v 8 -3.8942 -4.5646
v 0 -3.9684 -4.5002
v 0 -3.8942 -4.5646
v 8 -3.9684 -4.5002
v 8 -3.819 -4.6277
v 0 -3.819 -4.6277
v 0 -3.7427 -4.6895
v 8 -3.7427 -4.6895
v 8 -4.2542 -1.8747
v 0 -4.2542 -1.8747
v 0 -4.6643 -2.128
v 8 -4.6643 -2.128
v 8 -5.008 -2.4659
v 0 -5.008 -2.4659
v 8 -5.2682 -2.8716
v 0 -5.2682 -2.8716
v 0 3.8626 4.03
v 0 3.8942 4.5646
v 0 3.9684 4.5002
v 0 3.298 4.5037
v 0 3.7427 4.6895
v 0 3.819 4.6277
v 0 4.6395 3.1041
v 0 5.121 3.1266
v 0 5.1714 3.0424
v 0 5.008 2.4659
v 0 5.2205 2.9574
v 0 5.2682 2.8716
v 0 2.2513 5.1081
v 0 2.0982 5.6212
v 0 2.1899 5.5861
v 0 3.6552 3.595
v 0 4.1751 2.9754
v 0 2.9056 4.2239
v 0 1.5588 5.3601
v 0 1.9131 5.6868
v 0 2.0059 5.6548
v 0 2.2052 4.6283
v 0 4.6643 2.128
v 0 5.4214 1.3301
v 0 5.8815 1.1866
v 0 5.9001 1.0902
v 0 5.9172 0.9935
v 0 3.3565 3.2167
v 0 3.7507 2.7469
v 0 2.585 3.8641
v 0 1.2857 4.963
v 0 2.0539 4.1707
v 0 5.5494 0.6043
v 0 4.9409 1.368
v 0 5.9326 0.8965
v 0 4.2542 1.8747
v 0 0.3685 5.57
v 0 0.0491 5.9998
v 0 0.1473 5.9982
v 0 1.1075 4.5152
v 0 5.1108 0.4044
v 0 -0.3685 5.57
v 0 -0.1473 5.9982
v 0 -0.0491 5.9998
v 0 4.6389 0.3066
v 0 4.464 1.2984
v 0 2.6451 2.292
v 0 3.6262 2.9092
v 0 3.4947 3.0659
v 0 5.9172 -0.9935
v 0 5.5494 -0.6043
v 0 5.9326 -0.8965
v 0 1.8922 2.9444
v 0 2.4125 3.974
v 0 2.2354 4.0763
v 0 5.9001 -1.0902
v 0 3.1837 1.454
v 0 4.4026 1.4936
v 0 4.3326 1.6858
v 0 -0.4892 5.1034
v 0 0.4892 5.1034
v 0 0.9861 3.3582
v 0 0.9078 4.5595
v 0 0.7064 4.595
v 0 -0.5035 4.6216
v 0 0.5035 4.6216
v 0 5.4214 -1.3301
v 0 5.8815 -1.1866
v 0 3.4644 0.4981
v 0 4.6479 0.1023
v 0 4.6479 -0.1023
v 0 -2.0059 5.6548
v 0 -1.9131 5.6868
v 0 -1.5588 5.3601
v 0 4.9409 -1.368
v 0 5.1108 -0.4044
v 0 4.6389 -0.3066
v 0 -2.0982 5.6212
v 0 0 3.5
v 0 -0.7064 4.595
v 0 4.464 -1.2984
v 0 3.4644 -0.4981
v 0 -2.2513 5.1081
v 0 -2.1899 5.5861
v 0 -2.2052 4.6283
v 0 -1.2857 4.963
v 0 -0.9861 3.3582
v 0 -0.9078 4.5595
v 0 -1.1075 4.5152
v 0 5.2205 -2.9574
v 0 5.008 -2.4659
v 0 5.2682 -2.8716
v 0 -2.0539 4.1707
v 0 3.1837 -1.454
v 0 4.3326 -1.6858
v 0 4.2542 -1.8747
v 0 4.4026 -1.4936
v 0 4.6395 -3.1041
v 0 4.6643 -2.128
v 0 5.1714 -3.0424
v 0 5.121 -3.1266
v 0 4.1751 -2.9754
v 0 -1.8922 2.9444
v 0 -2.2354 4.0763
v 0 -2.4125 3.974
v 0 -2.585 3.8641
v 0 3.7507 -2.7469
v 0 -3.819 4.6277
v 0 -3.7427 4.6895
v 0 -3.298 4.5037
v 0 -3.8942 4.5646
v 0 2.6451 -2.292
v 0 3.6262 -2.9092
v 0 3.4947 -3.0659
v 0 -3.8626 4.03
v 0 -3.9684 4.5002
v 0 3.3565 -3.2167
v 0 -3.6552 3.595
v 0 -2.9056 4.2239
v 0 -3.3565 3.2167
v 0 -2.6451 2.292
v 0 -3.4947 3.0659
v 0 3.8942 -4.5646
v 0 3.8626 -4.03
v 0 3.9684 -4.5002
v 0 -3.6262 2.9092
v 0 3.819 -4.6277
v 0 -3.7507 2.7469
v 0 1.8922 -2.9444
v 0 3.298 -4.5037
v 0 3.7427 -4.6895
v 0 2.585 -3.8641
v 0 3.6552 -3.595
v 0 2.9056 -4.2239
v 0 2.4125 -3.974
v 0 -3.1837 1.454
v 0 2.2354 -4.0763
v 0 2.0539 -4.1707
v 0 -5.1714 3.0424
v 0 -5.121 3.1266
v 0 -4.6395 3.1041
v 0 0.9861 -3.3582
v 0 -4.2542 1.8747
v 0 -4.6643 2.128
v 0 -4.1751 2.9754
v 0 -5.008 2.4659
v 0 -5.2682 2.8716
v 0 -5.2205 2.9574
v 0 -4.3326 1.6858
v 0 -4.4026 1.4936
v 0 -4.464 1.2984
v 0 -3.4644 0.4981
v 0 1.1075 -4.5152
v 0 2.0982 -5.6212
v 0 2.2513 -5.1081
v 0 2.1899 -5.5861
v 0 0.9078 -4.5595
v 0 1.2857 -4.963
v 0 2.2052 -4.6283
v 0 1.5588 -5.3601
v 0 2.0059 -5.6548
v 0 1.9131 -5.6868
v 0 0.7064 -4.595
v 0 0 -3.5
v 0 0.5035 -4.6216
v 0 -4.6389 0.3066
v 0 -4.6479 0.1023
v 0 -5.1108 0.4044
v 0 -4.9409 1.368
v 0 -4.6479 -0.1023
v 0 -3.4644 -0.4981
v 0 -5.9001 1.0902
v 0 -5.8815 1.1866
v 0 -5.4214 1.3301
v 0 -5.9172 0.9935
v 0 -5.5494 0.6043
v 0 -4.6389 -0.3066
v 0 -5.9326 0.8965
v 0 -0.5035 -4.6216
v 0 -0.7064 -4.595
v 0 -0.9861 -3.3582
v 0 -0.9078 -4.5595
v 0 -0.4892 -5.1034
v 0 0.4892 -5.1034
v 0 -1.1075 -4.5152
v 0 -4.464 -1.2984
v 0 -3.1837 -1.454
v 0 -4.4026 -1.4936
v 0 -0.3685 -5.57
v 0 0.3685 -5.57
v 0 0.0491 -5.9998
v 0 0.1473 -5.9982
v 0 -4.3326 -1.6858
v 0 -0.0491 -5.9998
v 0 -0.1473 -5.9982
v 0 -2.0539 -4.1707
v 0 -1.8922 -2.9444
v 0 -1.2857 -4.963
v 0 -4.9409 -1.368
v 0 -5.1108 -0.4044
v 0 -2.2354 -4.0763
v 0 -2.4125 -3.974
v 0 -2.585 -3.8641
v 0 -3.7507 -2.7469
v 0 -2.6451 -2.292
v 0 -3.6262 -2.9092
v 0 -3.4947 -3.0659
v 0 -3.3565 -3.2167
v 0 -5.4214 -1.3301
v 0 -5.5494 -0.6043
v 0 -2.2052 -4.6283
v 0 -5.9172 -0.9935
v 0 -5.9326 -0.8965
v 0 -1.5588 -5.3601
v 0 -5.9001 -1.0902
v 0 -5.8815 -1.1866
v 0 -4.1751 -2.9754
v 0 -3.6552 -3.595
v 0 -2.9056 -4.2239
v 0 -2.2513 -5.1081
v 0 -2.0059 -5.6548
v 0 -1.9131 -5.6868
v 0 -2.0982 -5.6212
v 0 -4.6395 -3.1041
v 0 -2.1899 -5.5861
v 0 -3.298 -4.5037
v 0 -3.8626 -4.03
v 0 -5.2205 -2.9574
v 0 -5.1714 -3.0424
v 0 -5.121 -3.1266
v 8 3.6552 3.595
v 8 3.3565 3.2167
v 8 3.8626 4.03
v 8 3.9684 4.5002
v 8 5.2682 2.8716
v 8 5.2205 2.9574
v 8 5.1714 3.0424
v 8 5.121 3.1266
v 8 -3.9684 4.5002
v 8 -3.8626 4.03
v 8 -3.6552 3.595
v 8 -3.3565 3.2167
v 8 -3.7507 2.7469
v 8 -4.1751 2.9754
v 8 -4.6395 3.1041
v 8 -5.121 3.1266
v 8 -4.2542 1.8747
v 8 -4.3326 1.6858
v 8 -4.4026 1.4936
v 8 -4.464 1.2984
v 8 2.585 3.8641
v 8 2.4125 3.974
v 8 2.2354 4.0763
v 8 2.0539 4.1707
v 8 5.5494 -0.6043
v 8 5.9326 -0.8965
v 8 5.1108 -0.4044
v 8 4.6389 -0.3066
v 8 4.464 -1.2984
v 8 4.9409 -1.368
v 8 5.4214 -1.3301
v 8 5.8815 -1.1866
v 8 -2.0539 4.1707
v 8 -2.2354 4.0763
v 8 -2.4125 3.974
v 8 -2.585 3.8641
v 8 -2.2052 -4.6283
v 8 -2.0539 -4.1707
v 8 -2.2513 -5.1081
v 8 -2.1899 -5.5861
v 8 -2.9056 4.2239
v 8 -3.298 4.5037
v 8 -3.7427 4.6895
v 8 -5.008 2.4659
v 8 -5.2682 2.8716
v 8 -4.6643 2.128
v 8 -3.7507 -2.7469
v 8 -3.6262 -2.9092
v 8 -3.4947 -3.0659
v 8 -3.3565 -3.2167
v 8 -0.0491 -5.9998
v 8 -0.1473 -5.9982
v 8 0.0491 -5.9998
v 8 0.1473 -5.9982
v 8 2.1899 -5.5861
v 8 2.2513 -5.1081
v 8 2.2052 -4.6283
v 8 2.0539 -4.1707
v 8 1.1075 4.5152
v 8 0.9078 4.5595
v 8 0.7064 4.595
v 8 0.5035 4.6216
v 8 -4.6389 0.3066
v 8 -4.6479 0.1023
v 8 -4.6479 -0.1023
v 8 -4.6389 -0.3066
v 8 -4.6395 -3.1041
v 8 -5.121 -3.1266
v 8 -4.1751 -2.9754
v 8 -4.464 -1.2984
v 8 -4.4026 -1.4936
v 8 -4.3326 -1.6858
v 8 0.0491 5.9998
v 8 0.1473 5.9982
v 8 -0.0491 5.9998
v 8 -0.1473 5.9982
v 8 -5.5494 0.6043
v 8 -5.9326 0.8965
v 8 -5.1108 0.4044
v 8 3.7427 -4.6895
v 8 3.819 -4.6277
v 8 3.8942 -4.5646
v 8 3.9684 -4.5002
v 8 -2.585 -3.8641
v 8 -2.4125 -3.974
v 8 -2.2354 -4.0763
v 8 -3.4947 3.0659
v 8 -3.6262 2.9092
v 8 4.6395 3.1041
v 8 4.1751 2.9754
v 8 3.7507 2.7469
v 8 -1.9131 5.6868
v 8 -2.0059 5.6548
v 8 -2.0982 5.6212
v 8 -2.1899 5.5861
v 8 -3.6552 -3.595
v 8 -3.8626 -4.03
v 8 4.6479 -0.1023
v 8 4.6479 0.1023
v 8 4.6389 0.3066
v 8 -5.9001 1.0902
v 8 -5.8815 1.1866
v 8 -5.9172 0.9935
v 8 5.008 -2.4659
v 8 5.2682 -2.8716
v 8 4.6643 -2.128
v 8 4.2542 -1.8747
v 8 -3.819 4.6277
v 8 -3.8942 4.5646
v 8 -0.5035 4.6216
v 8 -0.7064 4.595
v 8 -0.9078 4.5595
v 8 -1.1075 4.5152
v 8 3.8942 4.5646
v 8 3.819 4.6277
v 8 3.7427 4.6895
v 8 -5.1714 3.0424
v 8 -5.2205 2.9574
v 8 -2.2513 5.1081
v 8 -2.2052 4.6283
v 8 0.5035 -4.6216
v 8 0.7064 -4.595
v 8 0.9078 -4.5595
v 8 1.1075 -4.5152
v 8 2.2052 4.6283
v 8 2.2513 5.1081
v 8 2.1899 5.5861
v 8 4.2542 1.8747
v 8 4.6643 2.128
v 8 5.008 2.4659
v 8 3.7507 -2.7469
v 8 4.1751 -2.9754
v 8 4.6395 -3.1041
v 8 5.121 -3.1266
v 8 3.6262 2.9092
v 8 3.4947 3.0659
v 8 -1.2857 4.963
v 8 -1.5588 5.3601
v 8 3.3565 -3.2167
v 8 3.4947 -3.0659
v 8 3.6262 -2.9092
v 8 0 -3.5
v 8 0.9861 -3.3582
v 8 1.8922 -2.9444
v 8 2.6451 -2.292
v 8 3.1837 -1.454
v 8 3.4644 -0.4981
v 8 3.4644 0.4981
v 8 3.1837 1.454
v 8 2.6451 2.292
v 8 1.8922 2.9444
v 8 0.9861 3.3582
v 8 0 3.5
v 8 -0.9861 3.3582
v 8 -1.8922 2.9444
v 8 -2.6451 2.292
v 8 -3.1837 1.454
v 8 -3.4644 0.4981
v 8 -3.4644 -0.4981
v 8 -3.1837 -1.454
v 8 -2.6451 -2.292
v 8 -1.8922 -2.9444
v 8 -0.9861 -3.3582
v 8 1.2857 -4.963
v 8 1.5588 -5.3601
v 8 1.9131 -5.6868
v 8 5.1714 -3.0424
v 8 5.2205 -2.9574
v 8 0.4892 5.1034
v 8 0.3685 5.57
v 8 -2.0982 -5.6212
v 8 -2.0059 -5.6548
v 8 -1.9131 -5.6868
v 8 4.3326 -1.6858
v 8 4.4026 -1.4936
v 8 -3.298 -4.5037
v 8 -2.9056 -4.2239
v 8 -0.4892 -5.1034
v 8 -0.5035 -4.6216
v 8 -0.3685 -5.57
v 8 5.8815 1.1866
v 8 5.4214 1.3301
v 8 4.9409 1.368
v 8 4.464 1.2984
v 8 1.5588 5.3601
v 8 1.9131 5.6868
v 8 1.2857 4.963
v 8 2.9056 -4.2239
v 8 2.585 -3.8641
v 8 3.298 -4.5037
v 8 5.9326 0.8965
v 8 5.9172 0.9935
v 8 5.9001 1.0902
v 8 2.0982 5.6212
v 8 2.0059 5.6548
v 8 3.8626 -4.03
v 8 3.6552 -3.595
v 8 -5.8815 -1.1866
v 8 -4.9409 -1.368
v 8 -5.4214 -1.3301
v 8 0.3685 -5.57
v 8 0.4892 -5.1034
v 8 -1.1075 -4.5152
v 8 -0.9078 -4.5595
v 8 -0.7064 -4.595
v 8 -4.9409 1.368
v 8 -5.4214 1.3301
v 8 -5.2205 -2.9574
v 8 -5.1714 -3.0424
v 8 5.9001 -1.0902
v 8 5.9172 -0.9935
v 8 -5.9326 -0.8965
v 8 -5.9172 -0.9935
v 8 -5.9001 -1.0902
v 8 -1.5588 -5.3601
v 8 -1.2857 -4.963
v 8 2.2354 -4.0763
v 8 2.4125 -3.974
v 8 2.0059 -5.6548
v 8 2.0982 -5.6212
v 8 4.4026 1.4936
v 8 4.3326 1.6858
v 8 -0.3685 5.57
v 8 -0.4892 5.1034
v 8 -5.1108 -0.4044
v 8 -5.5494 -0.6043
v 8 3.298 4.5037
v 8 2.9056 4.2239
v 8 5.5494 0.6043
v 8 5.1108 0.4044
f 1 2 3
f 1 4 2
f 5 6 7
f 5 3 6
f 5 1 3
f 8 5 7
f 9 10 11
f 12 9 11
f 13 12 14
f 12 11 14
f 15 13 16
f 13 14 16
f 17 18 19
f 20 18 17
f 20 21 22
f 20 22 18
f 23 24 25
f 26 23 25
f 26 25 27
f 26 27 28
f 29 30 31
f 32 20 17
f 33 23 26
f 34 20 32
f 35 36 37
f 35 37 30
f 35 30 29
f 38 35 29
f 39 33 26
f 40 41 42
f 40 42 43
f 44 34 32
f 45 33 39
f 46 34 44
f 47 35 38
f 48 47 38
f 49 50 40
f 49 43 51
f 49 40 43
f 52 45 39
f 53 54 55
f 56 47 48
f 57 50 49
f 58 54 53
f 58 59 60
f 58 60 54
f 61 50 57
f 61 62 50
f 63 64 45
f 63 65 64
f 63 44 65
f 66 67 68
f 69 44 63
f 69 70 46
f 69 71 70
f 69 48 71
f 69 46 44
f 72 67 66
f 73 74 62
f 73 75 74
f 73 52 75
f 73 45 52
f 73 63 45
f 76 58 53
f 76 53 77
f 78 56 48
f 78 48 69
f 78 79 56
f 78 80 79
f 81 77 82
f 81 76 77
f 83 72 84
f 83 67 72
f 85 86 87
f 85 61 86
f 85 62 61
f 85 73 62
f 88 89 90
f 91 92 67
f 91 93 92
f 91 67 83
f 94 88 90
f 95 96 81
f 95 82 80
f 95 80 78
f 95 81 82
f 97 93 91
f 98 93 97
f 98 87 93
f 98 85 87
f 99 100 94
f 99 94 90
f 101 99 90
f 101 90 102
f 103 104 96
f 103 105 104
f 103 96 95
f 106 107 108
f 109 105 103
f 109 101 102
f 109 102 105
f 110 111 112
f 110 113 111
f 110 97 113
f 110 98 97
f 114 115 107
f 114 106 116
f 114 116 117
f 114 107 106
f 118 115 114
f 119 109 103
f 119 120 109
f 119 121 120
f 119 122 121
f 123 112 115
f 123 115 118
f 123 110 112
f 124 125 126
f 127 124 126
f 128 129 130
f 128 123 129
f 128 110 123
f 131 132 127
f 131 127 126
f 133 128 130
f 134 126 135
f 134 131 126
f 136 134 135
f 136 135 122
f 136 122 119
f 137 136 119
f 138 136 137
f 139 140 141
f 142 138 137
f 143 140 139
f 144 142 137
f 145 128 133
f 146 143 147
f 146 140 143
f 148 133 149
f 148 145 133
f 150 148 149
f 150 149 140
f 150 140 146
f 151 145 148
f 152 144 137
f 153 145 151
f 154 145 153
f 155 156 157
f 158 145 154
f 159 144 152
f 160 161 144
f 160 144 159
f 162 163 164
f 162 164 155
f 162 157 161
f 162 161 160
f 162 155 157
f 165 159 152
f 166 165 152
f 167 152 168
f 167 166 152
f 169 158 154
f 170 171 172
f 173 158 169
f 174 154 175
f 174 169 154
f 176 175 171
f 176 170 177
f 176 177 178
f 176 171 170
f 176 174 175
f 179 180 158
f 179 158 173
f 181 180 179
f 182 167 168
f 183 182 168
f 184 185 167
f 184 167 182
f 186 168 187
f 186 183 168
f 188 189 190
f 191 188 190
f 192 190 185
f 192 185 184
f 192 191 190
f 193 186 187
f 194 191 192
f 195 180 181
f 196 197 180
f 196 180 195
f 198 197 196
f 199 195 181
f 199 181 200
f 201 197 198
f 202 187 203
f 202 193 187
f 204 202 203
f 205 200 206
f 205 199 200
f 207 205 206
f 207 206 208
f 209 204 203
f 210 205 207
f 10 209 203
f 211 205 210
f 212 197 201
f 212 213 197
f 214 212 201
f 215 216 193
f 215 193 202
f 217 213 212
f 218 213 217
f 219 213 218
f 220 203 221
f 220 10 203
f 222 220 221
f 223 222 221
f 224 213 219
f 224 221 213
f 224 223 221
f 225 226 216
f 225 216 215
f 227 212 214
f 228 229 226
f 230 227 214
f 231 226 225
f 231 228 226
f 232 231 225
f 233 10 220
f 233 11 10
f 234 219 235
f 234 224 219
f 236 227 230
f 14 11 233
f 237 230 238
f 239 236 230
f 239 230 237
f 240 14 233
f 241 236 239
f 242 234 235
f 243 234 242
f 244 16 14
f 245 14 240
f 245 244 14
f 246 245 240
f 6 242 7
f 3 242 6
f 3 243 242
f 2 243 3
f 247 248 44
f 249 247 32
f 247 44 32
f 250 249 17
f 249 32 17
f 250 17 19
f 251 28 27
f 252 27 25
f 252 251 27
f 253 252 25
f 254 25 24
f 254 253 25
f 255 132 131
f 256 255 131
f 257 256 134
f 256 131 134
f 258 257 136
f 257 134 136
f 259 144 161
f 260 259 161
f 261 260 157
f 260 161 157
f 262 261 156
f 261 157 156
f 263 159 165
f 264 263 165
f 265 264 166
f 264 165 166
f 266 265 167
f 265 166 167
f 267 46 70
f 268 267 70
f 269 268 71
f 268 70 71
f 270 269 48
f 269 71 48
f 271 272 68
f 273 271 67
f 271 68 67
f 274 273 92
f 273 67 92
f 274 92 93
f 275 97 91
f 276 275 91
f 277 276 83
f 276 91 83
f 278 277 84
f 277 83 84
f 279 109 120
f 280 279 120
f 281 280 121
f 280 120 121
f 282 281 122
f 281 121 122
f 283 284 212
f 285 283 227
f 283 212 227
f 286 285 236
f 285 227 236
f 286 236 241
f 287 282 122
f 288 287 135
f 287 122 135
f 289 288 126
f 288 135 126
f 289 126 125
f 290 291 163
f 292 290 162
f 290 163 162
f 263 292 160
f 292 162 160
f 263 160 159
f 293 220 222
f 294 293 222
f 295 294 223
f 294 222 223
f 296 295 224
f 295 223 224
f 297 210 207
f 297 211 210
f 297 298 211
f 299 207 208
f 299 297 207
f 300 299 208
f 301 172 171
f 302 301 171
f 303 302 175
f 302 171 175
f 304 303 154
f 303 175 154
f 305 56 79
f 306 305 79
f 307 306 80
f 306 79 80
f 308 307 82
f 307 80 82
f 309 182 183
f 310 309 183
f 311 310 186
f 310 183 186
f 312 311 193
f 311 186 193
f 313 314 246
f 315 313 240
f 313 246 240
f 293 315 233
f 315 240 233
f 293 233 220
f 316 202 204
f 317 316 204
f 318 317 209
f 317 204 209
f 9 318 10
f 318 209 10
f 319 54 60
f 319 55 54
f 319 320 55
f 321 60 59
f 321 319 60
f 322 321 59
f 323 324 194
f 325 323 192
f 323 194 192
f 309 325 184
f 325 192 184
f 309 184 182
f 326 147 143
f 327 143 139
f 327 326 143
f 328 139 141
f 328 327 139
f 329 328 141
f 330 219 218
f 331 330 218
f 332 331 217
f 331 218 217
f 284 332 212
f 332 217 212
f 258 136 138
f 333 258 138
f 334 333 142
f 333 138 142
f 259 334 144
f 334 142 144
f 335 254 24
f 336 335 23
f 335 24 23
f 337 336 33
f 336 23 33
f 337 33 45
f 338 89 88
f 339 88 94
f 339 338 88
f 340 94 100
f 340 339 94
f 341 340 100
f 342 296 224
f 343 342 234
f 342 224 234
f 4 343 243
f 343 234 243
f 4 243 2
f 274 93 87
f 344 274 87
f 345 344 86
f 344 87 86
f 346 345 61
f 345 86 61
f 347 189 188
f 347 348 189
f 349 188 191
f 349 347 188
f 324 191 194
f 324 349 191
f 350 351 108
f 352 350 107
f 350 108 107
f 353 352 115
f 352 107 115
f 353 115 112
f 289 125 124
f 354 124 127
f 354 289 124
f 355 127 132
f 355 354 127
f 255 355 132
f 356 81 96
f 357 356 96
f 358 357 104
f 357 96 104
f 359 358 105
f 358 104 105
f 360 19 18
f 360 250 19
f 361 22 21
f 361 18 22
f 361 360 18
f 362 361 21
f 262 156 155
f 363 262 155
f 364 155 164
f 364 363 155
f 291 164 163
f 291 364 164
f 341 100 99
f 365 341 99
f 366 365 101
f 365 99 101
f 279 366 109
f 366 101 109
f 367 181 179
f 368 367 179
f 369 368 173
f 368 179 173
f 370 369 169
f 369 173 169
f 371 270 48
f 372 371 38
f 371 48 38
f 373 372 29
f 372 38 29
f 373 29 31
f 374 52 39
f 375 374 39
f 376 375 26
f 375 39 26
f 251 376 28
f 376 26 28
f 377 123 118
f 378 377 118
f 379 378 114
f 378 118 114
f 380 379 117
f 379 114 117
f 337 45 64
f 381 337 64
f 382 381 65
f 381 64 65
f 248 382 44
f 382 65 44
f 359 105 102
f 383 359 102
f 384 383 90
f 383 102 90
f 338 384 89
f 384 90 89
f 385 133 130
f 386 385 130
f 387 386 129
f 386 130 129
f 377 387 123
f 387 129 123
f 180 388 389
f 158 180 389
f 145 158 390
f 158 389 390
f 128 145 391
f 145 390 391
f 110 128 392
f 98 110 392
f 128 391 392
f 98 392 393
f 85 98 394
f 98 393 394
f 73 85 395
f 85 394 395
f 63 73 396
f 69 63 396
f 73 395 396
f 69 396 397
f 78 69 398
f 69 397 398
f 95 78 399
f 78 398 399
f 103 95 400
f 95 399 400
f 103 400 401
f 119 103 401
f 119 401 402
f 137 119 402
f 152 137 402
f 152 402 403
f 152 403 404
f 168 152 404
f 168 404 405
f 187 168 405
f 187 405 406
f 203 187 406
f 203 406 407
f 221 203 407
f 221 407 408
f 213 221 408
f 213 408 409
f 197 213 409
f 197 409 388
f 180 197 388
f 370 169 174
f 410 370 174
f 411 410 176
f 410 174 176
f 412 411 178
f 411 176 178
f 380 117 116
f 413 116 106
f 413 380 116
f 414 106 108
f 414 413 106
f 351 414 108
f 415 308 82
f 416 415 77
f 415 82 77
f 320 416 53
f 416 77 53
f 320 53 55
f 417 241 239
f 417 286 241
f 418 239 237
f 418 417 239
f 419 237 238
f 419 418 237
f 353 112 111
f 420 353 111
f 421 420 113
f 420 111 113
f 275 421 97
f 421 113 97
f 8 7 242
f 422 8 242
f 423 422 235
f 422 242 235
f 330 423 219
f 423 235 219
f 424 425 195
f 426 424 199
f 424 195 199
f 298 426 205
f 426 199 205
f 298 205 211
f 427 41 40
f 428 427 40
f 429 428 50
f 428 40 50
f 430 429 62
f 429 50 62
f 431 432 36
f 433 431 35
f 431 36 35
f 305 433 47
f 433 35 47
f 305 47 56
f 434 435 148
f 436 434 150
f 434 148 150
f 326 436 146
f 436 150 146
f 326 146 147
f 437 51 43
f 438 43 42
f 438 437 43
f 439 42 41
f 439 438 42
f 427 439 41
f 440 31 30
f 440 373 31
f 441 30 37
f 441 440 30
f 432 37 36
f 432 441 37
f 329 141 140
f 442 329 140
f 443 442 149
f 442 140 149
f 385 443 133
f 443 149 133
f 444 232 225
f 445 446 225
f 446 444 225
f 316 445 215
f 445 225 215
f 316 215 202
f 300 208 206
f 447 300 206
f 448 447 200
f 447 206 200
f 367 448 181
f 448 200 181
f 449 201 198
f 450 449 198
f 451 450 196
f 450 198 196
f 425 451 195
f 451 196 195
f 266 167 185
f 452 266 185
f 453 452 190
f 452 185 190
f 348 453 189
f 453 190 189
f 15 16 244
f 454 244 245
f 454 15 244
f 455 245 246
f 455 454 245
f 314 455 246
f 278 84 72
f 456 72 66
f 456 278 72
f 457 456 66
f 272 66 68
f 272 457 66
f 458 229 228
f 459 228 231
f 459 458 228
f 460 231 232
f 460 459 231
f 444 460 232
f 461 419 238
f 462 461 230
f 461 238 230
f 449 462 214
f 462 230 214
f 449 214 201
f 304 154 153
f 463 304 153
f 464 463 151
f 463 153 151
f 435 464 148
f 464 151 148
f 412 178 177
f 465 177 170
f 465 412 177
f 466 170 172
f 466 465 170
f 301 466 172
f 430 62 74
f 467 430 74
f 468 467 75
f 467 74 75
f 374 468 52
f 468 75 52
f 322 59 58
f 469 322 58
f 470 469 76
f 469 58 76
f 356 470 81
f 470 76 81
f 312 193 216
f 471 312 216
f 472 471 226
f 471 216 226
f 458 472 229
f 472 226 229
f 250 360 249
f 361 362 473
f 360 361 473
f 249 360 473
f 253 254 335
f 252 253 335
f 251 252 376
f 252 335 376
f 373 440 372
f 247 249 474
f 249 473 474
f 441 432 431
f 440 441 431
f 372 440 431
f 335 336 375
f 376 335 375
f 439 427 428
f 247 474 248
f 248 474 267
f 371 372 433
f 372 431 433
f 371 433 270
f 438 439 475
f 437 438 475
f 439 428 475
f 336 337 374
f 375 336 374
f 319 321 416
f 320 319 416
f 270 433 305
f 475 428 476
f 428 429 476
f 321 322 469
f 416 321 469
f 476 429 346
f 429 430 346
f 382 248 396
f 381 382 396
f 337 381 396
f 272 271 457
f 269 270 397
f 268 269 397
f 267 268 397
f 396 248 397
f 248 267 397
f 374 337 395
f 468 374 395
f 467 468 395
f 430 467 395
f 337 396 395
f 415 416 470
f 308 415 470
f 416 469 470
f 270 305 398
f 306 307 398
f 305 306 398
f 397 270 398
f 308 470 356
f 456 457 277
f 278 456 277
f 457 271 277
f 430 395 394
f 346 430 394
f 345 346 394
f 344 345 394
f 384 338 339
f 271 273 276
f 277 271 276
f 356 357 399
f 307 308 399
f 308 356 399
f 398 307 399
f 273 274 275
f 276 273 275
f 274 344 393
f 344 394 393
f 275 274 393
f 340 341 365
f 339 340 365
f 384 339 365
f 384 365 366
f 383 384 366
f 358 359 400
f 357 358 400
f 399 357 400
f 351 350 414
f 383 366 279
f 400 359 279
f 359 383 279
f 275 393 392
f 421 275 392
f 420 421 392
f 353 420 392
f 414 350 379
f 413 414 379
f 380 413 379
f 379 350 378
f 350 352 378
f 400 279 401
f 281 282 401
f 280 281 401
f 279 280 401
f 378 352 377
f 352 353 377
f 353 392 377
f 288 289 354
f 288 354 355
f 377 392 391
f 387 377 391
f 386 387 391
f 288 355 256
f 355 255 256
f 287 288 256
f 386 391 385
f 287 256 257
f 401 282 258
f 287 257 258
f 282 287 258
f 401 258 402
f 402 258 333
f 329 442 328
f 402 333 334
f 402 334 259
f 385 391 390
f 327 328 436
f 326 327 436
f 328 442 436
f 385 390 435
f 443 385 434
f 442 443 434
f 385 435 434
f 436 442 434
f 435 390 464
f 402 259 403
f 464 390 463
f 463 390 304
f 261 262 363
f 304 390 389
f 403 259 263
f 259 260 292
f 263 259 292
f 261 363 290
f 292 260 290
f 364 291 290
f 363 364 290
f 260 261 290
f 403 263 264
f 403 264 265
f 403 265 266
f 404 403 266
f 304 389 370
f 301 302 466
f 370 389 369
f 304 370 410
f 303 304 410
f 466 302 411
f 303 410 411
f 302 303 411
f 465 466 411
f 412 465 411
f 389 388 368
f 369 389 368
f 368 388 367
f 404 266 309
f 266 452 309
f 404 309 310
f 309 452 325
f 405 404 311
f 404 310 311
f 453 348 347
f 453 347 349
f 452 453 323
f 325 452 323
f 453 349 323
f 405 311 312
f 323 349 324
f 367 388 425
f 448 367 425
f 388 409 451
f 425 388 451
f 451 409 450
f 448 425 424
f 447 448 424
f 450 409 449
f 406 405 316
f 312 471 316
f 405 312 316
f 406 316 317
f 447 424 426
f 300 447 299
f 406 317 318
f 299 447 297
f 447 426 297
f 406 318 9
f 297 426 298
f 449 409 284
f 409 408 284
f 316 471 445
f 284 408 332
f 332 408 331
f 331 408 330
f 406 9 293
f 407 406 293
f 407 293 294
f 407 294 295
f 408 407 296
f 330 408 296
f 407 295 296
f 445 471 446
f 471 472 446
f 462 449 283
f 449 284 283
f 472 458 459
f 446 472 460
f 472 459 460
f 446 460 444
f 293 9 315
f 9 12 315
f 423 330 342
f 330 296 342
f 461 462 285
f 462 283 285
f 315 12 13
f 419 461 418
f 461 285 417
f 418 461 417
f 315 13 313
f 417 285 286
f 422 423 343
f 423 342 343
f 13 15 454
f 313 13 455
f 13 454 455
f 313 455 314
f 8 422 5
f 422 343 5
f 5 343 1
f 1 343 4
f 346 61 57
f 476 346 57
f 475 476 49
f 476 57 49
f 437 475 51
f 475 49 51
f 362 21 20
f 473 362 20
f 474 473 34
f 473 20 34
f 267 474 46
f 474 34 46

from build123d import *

# Parameters (mm, degrees)
BASPROSKE_W        = 8
BASPROSKE_H        = 6
TOOTHCUT_DEPTH     = 12.66190379
TEETHCUTS_COUNT    = 18
TEETHCUTS_ANGLE    = 340
BORSKE_R           = 0.5
BORE_DEPTH         = 50.0000508
SKETCH1_R          = 3.5
CUT_EXTRUDE1_DEPTH = 12.627390673


with BuildPart() as part:
    # BasProSke → Base-Revolve (revolve)
    with BuildSketch(Plane(origin=(0, 0, 0), x_dir=(1, 0, 0), z_dir=(0, 1, 0)), mode=Mode.PRIVATE) as base_revolve_sk:
        with Locations((4, 3)):
            Rectangle(BASPROSKE_W, BASPROSKE_H)
    revolve(base_revolve_sk.sketch.rotate(Axis((-10, 0, 0), (1, 0, 0)), 180), axis=Axis((-10, 0, 0), (1, 0, 0)))

    # TooCutSke → ToothCut (cut, through all)
    with BuildSketch(Plane(origin=(0, 0, 0), x_dir=(0, 0, -1), z_dir=(1, 0, 0))):
        with BuildLine():
            ThreePointArc((0.306649621, 4.638875619), (0, 4.649), (-0.306649621, 4.638875619))
            ThreePointArc((-0.306649621, 4.638875619), (-0.498605842, 5.349852231), (-0.918258882, 5.955018538))
            ThreePointArc((-0.918258882, 5.955018538), (0, 6.0254), (0.918258882, 5.955018538))
            ThreePointArc((0.918258882, 5.955018538), (0.498605842, 5.349852231), (0.306649621, 4.638875619))
        make_face()
    toothcut = extrude(amount=TOOTHCUT_DEPTH, mode=Mode.SUBTRACT)

    # TeethCuts: ToothCut ×18 about axis
    teethcuts_axis = Axis((-10, 0, 0), (1, 0, 0))
    for i in range(1, TEETHCUTS_COUNT):
        add(toothcut.rotate(teethcuts_axis, i * TEETHCUTS_ANGLE / (TEETHCUTS_COUNT - 1)), mode=Mode.SUBTRACT)

    # BorSke → Bore (cut, symmetric)
    with BuildSketch(Plane(origin=(0, 0, 0), x_dir=(0, 0, -1), z_dir=(1, 0, 0))):
        with Locations(Location((0, 0, 0), (0, 0, 180))):
            Circle(BORSKE_R)
    extrude(amount=BORE_DEPTH, both=True, mode=Mode.SUBTRACT)

    # Sketch1 → Cut-Extrude1 (cut, through all)
    with BuildSketch(Plane(origin=(8, 0, 0), x_dir=(0, 0, -1), z_dir=(1, 0, 0))):
        Circle(SKETCH1_R)
    extrude(amount=-CUT_EXTRUDE1_DEPTH, mode=Mode.SUBTRACT)


solid = part.part
